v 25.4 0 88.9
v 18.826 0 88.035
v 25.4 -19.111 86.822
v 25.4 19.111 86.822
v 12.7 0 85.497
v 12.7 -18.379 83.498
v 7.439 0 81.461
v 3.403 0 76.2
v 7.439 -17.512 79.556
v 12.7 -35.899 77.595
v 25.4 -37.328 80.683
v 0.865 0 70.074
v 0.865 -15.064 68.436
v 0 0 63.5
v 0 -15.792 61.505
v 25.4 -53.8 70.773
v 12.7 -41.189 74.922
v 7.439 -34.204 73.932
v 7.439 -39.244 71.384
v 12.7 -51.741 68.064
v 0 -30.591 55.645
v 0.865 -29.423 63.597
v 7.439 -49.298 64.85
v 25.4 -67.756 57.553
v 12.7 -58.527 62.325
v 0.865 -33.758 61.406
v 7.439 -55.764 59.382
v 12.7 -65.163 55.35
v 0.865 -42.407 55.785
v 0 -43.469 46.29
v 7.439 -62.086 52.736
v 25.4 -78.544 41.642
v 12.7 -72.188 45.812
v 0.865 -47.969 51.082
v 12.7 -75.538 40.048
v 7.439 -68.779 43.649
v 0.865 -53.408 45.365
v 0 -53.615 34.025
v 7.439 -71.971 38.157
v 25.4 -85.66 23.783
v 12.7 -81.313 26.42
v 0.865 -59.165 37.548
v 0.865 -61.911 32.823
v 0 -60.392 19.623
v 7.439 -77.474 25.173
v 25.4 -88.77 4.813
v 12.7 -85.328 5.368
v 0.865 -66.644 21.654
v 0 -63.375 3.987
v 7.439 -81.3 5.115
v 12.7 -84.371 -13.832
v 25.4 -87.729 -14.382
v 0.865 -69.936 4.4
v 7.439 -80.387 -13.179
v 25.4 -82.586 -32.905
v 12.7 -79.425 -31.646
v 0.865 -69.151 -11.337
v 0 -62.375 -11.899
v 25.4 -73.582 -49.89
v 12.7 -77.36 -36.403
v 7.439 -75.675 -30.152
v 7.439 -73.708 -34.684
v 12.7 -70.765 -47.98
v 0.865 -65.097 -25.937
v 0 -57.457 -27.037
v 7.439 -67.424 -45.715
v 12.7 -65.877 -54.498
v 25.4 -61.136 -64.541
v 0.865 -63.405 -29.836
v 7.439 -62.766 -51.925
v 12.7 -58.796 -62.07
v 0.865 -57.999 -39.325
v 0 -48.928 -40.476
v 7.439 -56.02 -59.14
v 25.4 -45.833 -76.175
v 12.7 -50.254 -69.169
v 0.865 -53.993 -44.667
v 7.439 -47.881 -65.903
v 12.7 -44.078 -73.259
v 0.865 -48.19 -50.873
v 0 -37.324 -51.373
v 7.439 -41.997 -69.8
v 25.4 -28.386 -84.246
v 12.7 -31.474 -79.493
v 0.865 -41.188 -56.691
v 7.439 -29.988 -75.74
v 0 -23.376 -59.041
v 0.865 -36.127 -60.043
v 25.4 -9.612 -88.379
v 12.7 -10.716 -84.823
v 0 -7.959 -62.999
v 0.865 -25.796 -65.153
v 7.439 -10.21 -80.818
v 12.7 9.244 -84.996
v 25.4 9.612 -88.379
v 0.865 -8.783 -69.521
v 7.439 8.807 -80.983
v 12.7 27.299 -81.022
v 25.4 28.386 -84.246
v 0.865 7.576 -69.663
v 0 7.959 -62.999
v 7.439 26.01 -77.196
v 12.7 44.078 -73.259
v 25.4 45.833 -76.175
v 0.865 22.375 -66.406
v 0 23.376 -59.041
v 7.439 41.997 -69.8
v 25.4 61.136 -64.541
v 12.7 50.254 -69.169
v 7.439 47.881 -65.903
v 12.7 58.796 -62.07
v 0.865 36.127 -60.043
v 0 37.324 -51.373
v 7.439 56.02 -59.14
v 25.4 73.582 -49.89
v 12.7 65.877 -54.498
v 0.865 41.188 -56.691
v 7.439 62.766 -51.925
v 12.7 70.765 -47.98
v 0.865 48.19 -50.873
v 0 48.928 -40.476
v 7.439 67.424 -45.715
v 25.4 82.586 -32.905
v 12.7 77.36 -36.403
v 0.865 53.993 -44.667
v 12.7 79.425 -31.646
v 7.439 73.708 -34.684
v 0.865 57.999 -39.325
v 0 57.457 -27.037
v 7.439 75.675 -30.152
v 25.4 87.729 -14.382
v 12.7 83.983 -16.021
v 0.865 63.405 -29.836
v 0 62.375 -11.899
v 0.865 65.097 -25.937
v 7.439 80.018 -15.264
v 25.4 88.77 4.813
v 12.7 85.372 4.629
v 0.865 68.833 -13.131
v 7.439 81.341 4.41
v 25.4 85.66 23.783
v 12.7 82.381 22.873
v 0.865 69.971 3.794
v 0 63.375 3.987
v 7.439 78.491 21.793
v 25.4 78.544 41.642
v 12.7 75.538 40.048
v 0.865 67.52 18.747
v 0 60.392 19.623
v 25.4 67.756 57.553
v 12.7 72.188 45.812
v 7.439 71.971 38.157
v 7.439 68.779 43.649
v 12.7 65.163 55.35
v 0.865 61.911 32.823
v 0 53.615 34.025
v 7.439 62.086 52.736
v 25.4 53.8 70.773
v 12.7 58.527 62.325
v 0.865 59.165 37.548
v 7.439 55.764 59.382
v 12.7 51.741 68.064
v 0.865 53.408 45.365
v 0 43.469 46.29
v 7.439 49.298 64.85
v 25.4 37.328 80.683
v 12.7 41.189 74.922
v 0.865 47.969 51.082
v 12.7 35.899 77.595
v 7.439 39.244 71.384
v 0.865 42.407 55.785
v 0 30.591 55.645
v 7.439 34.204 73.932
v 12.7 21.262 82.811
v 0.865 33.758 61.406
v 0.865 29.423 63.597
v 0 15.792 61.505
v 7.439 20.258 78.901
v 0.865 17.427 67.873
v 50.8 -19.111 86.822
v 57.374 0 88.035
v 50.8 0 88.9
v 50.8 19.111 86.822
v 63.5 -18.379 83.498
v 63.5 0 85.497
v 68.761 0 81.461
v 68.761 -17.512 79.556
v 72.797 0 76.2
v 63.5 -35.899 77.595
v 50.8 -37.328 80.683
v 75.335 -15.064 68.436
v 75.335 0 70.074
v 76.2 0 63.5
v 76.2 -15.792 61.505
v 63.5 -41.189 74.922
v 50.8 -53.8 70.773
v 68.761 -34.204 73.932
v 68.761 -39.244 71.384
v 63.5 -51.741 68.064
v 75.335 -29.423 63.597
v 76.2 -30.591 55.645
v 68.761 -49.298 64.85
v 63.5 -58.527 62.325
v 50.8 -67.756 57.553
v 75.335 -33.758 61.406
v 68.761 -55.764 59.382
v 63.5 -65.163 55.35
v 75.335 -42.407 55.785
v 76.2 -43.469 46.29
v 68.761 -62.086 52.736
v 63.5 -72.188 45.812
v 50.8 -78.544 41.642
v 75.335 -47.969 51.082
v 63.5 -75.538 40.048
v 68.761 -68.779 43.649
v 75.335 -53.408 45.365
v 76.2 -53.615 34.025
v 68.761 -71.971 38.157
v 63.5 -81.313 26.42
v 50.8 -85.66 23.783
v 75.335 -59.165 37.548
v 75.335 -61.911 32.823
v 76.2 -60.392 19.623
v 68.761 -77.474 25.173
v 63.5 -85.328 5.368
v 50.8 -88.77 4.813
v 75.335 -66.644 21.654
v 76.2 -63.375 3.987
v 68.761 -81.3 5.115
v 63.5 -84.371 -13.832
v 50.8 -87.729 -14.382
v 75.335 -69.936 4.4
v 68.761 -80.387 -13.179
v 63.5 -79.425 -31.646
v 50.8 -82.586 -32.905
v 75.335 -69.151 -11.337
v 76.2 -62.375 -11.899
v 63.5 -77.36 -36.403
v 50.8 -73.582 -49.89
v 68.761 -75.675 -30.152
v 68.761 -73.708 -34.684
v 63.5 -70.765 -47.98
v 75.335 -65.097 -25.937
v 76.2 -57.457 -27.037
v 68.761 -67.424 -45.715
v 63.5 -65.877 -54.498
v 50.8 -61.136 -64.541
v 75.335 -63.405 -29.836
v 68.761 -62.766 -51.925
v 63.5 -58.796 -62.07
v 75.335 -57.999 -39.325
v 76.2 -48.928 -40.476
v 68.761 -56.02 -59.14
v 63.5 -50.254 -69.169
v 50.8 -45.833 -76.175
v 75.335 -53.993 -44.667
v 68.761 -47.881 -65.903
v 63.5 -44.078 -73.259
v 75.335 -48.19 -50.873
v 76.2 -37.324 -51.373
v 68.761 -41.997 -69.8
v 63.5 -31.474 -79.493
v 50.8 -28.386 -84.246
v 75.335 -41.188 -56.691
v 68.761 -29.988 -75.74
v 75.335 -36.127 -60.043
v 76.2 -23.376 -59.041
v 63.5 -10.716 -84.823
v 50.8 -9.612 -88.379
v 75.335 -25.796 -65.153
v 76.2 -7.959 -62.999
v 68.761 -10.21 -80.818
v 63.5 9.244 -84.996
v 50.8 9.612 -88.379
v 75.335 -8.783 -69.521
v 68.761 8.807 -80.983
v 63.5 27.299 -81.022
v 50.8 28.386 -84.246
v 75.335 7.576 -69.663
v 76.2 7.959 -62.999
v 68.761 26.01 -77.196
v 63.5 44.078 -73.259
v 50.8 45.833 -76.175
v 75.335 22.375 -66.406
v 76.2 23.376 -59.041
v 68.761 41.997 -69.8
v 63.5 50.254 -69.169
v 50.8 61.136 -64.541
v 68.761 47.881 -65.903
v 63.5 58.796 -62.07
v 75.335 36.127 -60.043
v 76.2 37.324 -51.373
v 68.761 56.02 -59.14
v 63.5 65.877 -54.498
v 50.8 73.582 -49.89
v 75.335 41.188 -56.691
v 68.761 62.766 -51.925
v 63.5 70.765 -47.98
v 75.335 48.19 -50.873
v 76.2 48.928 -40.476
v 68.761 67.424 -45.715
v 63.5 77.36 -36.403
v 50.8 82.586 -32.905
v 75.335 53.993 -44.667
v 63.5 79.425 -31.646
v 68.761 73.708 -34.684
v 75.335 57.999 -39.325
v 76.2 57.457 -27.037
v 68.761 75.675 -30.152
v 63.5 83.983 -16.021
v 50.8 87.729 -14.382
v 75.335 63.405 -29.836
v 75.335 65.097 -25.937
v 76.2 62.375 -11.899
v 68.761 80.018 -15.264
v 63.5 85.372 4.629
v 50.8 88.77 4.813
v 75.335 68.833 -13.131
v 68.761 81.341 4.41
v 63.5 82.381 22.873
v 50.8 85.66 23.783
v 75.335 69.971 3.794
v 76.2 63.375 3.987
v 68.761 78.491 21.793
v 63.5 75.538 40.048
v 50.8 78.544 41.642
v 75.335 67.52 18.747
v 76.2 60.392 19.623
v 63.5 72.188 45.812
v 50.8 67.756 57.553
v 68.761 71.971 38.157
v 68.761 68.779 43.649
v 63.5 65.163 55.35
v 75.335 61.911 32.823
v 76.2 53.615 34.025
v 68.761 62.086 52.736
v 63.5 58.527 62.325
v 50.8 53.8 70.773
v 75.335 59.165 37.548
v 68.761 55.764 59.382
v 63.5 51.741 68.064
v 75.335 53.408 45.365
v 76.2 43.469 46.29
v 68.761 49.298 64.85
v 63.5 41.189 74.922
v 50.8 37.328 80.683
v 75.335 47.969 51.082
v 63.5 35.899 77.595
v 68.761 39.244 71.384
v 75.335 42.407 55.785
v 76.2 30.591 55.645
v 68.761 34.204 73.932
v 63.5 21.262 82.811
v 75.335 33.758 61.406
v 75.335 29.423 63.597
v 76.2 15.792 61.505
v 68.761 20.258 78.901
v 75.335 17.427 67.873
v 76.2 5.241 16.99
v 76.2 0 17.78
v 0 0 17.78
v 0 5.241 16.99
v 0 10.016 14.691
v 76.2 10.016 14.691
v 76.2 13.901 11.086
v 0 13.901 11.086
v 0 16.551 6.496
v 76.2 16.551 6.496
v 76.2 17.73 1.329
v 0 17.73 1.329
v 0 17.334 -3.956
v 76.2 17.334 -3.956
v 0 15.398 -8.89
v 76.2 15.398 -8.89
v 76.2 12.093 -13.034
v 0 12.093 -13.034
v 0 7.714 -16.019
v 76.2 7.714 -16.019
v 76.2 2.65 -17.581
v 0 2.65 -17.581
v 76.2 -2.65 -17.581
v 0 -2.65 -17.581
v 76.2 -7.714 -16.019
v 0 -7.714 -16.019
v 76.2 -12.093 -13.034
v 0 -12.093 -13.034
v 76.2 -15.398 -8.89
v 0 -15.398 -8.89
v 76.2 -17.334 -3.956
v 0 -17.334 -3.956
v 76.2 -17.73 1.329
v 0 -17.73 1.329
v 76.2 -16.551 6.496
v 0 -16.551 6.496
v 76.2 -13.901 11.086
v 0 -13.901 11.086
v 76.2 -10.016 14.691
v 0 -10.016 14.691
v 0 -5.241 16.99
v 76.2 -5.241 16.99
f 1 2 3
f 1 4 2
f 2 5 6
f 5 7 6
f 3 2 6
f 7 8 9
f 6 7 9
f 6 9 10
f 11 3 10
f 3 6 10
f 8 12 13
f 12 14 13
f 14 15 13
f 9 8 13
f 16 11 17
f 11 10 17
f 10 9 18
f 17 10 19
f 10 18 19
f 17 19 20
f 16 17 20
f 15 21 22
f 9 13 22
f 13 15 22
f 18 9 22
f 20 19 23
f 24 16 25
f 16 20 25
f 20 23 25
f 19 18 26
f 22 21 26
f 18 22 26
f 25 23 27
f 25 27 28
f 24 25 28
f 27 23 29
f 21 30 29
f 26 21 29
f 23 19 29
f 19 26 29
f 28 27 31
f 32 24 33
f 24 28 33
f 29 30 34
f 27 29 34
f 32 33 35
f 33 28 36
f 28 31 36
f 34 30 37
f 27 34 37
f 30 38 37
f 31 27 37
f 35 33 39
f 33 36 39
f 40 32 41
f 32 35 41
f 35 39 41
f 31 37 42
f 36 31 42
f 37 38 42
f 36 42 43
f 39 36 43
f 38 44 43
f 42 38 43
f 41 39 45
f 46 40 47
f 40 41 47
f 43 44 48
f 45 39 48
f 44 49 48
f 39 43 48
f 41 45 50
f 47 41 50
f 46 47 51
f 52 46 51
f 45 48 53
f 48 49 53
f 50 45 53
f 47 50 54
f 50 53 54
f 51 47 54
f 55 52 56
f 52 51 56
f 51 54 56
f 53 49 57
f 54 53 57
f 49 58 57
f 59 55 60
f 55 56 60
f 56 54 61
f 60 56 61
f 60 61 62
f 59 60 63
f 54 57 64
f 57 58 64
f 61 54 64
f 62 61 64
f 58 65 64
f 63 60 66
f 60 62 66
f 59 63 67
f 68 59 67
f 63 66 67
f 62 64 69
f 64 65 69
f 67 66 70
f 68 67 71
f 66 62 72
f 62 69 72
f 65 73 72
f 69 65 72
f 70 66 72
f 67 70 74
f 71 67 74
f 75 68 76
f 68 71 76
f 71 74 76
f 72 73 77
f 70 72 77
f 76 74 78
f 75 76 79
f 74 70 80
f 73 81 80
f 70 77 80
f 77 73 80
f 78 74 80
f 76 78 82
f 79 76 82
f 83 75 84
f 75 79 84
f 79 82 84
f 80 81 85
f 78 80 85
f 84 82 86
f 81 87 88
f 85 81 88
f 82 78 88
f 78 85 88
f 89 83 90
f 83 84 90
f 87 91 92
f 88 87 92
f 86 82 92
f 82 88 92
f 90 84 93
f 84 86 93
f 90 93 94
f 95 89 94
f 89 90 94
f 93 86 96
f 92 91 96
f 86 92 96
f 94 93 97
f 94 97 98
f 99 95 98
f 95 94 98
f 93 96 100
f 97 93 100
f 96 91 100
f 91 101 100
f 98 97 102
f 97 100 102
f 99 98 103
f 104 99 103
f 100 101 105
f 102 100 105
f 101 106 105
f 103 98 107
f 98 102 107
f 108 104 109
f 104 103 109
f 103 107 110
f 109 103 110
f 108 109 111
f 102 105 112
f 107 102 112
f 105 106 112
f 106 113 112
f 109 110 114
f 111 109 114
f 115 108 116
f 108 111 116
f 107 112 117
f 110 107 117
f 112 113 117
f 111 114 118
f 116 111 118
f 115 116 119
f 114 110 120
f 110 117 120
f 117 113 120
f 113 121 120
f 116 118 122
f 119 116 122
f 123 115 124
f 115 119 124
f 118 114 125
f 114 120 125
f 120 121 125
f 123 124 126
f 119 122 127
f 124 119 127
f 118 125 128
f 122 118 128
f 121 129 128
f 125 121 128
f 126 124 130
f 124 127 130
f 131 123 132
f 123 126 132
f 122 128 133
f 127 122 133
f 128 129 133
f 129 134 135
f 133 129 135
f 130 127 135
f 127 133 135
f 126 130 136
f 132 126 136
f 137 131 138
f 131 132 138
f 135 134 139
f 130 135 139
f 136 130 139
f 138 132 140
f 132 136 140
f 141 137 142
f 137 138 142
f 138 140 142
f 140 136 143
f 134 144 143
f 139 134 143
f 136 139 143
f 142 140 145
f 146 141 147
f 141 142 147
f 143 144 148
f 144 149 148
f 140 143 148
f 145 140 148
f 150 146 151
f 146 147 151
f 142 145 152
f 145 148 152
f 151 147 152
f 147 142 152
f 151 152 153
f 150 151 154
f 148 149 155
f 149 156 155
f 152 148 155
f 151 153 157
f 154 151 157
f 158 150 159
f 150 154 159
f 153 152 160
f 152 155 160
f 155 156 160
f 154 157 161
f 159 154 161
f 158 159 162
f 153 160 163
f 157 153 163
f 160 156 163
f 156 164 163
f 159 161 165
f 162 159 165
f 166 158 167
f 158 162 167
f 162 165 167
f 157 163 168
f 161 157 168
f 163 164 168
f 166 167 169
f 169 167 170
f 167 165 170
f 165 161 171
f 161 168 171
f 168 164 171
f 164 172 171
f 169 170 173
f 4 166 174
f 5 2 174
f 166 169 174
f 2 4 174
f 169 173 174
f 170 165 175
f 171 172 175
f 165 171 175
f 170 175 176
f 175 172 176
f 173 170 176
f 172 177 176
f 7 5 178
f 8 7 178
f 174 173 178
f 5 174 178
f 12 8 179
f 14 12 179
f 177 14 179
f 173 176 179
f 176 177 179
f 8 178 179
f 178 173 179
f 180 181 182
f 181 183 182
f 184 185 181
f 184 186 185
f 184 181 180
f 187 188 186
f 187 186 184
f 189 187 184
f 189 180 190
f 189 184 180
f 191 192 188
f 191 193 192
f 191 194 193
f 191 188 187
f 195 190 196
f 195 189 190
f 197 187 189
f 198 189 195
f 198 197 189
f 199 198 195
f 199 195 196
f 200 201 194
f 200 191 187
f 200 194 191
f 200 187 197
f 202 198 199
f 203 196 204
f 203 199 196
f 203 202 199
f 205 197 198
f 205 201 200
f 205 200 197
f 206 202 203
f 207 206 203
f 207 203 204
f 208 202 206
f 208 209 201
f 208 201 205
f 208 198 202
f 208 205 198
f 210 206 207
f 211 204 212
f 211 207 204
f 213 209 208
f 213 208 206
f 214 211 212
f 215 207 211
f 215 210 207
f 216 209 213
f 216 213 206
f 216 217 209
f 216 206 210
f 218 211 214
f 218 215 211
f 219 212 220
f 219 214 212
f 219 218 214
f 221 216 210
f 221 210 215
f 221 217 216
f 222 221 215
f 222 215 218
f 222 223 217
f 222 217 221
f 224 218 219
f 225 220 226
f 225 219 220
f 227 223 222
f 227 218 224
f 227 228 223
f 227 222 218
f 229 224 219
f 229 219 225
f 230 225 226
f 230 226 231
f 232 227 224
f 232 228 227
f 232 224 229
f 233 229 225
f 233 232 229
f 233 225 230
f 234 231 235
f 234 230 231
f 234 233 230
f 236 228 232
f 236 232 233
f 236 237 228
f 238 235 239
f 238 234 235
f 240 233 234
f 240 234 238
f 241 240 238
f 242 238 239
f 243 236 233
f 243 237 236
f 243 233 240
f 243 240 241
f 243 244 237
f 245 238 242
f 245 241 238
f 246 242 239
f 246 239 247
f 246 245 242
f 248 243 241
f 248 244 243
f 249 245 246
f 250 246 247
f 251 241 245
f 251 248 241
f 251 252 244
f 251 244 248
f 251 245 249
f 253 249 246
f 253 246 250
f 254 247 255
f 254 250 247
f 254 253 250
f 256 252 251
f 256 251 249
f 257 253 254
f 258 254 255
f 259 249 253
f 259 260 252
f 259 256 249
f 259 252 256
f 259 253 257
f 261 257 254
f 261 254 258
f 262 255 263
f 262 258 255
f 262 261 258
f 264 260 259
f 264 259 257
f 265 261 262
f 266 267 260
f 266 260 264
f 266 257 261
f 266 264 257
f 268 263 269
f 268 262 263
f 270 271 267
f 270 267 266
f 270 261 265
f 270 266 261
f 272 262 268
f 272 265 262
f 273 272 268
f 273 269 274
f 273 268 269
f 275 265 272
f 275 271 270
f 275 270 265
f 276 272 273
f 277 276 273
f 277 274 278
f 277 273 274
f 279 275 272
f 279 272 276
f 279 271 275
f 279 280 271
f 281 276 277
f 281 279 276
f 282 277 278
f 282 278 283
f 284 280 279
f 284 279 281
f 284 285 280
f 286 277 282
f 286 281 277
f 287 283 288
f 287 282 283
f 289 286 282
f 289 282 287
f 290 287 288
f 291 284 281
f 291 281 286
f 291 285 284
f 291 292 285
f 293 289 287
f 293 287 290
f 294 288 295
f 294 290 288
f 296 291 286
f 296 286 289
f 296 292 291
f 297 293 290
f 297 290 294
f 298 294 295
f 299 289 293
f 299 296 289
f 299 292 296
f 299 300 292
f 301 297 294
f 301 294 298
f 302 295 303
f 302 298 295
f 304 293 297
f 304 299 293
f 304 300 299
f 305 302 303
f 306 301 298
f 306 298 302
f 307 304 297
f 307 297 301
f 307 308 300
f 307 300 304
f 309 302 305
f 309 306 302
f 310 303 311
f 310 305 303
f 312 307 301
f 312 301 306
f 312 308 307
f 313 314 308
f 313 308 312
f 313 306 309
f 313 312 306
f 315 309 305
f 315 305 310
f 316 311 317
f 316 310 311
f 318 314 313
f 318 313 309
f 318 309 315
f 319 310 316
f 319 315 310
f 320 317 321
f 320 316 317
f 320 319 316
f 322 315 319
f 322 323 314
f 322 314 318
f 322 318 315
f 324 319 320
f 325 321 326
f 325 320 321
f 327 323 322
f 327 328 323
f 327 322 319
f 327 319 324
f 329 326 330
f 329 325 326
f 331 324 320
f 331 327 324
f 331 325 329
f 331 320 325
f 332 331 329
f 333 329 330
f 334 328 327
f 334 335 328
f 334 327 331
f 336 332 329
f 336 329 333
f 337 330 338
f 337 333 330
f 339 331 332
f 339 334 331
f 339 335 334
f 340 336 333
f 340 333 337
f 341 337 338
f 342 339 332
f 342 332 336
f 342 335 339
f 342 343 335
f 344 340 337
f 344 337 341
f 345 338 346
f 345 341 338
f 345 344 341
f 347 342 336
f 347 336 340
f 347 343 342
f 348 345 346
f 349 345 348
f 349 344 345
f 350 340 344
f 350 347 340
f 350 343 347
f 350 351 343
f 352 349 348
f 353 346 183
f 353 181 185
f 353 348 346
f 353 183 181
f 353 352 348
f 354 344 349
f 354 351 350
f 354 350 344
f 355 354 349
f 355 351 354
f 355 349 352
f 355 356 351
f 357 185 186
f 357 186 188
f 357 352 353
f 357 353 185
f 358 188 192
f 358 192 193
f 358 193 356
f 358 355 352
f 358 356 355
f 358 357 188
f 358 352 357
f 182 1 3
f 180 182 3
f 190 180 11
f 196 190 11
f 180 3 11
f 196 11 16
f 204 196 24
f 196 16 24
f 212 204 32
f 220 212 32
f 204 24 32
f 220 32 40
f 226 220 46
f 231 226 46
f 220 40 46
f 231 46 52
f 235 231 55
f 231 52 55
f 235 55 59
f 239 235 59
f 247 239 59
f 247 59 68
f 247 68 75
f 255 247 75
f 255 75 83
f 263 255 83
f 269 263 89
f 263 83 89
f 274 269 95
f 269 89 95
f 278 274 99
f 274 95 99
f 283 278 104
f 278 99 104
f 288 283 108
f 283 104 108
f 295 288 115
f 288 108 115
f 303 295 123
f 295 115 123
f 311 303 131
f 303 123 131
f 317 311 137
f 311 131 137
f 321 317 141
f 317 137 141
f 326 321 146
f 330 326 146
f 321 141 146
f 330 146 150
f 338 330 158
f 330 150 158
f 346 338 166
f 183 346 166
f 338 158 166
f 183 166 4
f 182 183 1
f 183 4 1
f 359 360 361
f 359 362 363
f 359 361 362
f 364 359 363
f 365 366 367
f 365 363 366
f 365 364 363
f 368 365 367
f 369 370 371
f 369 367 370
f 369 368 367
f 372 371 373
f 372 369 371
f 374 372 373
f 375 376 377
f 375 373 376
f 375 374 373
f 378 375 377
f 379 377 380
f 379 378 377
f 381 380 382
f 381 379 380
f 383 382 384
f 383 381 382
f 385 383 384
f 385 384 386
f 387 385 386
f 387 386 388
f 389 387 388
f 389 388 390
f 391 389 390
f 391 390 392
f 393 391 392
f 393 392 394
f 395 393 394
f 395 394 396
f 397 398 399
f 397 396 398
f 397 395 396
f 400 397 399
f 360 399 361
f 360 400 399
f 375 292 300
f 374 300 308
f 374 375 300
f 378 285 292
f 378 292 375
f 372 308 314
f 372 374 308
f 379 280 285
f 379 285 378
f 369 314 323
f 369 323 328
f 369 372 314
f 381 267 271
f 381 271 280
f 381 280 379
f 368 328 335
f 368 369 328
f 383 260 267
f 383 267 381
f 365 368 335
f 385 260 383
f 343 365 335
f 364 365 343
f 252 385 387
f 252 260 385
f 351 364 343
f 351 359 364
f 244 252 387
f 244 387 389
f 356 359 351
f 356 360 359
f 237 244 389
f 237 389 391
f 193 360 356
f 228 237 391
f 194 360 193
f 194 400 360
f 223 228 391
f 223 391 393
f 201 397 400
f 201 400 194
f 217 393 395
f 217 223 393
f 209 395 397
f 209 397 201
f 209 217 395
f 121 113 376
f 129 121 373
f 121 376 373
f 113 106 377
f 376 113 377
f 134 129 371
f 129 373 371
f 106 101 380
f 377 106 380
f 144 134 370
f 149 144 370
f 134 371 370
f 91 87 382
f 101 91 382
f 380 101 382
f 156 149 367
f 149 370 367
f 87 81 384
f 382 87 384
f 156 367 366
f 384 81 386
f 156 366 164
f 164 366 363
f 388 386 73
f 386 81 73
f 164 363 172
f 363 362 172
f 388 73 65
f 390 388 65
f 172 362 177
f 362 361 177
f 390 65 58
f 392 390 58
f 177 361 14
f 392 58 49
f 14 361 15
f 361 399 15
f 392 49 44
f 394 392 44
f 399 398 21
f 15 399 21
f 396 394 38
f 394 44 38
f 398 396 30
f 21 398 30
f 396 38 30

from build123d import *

# Parameters (mm, degrees)
SKETCH1_R               = 88.9
BOSS_EXTRUDE1_DEPTH     = 76.2
FILLET1_R               = 25.4
FILLET2_R               = 25.4
CUT_EXTRUDE1_DEPTH      = 148.013128726
CUT_EXTRUDE1_DEPTH_BACK = 148.013128726
SKETCH2_R               = 17.78


with BuildPart() as part:
    # Sketch1 → Boss-Extrude1 (new body)
    with BuildSketch(Plane(origin=(0, 0, 0), x_dir=(0, 0, -1), z_dir=(1, 0, 0))):
        with Locations(Location((0, 0, 0), (0, 0, 180))):
            Circle(SKETCH1_R)
    extrude(amount=BOSS_EXTRUDE1_DEPTH)

    # Fillet1
    fillet1_edges = [part.edges().sort_by_distance(p)[0] for p in [
        (76.2, 0, -88.9),
    ]]
    fillet(fillet1_edges, radius=FILLET1_R)

    # Fillet2
    fillet2_edges = [part.edges().sort_by_distance(p)[0] for p in [
        (0, 0, -88.9),
    ]]
    fillet(fillet2_edges, radius=FILLET2_R)

    # Sketch2 → Cut-Extrude1 (cut, two sides: drawn at the far end of the back side and taken through both)
    with BuildSketch(Plane.ZY.offset(-CUT_EXTRUDE1_DEPTH_BACK)):
        Circle(SKETCH2_R)
    extrude(amount=CUT_EXTRUDE1_DEPTH + CUT_EXTRUDE1_DEPTH_BACK, mode=Mode.SUBTRACT)


solid = part.part
